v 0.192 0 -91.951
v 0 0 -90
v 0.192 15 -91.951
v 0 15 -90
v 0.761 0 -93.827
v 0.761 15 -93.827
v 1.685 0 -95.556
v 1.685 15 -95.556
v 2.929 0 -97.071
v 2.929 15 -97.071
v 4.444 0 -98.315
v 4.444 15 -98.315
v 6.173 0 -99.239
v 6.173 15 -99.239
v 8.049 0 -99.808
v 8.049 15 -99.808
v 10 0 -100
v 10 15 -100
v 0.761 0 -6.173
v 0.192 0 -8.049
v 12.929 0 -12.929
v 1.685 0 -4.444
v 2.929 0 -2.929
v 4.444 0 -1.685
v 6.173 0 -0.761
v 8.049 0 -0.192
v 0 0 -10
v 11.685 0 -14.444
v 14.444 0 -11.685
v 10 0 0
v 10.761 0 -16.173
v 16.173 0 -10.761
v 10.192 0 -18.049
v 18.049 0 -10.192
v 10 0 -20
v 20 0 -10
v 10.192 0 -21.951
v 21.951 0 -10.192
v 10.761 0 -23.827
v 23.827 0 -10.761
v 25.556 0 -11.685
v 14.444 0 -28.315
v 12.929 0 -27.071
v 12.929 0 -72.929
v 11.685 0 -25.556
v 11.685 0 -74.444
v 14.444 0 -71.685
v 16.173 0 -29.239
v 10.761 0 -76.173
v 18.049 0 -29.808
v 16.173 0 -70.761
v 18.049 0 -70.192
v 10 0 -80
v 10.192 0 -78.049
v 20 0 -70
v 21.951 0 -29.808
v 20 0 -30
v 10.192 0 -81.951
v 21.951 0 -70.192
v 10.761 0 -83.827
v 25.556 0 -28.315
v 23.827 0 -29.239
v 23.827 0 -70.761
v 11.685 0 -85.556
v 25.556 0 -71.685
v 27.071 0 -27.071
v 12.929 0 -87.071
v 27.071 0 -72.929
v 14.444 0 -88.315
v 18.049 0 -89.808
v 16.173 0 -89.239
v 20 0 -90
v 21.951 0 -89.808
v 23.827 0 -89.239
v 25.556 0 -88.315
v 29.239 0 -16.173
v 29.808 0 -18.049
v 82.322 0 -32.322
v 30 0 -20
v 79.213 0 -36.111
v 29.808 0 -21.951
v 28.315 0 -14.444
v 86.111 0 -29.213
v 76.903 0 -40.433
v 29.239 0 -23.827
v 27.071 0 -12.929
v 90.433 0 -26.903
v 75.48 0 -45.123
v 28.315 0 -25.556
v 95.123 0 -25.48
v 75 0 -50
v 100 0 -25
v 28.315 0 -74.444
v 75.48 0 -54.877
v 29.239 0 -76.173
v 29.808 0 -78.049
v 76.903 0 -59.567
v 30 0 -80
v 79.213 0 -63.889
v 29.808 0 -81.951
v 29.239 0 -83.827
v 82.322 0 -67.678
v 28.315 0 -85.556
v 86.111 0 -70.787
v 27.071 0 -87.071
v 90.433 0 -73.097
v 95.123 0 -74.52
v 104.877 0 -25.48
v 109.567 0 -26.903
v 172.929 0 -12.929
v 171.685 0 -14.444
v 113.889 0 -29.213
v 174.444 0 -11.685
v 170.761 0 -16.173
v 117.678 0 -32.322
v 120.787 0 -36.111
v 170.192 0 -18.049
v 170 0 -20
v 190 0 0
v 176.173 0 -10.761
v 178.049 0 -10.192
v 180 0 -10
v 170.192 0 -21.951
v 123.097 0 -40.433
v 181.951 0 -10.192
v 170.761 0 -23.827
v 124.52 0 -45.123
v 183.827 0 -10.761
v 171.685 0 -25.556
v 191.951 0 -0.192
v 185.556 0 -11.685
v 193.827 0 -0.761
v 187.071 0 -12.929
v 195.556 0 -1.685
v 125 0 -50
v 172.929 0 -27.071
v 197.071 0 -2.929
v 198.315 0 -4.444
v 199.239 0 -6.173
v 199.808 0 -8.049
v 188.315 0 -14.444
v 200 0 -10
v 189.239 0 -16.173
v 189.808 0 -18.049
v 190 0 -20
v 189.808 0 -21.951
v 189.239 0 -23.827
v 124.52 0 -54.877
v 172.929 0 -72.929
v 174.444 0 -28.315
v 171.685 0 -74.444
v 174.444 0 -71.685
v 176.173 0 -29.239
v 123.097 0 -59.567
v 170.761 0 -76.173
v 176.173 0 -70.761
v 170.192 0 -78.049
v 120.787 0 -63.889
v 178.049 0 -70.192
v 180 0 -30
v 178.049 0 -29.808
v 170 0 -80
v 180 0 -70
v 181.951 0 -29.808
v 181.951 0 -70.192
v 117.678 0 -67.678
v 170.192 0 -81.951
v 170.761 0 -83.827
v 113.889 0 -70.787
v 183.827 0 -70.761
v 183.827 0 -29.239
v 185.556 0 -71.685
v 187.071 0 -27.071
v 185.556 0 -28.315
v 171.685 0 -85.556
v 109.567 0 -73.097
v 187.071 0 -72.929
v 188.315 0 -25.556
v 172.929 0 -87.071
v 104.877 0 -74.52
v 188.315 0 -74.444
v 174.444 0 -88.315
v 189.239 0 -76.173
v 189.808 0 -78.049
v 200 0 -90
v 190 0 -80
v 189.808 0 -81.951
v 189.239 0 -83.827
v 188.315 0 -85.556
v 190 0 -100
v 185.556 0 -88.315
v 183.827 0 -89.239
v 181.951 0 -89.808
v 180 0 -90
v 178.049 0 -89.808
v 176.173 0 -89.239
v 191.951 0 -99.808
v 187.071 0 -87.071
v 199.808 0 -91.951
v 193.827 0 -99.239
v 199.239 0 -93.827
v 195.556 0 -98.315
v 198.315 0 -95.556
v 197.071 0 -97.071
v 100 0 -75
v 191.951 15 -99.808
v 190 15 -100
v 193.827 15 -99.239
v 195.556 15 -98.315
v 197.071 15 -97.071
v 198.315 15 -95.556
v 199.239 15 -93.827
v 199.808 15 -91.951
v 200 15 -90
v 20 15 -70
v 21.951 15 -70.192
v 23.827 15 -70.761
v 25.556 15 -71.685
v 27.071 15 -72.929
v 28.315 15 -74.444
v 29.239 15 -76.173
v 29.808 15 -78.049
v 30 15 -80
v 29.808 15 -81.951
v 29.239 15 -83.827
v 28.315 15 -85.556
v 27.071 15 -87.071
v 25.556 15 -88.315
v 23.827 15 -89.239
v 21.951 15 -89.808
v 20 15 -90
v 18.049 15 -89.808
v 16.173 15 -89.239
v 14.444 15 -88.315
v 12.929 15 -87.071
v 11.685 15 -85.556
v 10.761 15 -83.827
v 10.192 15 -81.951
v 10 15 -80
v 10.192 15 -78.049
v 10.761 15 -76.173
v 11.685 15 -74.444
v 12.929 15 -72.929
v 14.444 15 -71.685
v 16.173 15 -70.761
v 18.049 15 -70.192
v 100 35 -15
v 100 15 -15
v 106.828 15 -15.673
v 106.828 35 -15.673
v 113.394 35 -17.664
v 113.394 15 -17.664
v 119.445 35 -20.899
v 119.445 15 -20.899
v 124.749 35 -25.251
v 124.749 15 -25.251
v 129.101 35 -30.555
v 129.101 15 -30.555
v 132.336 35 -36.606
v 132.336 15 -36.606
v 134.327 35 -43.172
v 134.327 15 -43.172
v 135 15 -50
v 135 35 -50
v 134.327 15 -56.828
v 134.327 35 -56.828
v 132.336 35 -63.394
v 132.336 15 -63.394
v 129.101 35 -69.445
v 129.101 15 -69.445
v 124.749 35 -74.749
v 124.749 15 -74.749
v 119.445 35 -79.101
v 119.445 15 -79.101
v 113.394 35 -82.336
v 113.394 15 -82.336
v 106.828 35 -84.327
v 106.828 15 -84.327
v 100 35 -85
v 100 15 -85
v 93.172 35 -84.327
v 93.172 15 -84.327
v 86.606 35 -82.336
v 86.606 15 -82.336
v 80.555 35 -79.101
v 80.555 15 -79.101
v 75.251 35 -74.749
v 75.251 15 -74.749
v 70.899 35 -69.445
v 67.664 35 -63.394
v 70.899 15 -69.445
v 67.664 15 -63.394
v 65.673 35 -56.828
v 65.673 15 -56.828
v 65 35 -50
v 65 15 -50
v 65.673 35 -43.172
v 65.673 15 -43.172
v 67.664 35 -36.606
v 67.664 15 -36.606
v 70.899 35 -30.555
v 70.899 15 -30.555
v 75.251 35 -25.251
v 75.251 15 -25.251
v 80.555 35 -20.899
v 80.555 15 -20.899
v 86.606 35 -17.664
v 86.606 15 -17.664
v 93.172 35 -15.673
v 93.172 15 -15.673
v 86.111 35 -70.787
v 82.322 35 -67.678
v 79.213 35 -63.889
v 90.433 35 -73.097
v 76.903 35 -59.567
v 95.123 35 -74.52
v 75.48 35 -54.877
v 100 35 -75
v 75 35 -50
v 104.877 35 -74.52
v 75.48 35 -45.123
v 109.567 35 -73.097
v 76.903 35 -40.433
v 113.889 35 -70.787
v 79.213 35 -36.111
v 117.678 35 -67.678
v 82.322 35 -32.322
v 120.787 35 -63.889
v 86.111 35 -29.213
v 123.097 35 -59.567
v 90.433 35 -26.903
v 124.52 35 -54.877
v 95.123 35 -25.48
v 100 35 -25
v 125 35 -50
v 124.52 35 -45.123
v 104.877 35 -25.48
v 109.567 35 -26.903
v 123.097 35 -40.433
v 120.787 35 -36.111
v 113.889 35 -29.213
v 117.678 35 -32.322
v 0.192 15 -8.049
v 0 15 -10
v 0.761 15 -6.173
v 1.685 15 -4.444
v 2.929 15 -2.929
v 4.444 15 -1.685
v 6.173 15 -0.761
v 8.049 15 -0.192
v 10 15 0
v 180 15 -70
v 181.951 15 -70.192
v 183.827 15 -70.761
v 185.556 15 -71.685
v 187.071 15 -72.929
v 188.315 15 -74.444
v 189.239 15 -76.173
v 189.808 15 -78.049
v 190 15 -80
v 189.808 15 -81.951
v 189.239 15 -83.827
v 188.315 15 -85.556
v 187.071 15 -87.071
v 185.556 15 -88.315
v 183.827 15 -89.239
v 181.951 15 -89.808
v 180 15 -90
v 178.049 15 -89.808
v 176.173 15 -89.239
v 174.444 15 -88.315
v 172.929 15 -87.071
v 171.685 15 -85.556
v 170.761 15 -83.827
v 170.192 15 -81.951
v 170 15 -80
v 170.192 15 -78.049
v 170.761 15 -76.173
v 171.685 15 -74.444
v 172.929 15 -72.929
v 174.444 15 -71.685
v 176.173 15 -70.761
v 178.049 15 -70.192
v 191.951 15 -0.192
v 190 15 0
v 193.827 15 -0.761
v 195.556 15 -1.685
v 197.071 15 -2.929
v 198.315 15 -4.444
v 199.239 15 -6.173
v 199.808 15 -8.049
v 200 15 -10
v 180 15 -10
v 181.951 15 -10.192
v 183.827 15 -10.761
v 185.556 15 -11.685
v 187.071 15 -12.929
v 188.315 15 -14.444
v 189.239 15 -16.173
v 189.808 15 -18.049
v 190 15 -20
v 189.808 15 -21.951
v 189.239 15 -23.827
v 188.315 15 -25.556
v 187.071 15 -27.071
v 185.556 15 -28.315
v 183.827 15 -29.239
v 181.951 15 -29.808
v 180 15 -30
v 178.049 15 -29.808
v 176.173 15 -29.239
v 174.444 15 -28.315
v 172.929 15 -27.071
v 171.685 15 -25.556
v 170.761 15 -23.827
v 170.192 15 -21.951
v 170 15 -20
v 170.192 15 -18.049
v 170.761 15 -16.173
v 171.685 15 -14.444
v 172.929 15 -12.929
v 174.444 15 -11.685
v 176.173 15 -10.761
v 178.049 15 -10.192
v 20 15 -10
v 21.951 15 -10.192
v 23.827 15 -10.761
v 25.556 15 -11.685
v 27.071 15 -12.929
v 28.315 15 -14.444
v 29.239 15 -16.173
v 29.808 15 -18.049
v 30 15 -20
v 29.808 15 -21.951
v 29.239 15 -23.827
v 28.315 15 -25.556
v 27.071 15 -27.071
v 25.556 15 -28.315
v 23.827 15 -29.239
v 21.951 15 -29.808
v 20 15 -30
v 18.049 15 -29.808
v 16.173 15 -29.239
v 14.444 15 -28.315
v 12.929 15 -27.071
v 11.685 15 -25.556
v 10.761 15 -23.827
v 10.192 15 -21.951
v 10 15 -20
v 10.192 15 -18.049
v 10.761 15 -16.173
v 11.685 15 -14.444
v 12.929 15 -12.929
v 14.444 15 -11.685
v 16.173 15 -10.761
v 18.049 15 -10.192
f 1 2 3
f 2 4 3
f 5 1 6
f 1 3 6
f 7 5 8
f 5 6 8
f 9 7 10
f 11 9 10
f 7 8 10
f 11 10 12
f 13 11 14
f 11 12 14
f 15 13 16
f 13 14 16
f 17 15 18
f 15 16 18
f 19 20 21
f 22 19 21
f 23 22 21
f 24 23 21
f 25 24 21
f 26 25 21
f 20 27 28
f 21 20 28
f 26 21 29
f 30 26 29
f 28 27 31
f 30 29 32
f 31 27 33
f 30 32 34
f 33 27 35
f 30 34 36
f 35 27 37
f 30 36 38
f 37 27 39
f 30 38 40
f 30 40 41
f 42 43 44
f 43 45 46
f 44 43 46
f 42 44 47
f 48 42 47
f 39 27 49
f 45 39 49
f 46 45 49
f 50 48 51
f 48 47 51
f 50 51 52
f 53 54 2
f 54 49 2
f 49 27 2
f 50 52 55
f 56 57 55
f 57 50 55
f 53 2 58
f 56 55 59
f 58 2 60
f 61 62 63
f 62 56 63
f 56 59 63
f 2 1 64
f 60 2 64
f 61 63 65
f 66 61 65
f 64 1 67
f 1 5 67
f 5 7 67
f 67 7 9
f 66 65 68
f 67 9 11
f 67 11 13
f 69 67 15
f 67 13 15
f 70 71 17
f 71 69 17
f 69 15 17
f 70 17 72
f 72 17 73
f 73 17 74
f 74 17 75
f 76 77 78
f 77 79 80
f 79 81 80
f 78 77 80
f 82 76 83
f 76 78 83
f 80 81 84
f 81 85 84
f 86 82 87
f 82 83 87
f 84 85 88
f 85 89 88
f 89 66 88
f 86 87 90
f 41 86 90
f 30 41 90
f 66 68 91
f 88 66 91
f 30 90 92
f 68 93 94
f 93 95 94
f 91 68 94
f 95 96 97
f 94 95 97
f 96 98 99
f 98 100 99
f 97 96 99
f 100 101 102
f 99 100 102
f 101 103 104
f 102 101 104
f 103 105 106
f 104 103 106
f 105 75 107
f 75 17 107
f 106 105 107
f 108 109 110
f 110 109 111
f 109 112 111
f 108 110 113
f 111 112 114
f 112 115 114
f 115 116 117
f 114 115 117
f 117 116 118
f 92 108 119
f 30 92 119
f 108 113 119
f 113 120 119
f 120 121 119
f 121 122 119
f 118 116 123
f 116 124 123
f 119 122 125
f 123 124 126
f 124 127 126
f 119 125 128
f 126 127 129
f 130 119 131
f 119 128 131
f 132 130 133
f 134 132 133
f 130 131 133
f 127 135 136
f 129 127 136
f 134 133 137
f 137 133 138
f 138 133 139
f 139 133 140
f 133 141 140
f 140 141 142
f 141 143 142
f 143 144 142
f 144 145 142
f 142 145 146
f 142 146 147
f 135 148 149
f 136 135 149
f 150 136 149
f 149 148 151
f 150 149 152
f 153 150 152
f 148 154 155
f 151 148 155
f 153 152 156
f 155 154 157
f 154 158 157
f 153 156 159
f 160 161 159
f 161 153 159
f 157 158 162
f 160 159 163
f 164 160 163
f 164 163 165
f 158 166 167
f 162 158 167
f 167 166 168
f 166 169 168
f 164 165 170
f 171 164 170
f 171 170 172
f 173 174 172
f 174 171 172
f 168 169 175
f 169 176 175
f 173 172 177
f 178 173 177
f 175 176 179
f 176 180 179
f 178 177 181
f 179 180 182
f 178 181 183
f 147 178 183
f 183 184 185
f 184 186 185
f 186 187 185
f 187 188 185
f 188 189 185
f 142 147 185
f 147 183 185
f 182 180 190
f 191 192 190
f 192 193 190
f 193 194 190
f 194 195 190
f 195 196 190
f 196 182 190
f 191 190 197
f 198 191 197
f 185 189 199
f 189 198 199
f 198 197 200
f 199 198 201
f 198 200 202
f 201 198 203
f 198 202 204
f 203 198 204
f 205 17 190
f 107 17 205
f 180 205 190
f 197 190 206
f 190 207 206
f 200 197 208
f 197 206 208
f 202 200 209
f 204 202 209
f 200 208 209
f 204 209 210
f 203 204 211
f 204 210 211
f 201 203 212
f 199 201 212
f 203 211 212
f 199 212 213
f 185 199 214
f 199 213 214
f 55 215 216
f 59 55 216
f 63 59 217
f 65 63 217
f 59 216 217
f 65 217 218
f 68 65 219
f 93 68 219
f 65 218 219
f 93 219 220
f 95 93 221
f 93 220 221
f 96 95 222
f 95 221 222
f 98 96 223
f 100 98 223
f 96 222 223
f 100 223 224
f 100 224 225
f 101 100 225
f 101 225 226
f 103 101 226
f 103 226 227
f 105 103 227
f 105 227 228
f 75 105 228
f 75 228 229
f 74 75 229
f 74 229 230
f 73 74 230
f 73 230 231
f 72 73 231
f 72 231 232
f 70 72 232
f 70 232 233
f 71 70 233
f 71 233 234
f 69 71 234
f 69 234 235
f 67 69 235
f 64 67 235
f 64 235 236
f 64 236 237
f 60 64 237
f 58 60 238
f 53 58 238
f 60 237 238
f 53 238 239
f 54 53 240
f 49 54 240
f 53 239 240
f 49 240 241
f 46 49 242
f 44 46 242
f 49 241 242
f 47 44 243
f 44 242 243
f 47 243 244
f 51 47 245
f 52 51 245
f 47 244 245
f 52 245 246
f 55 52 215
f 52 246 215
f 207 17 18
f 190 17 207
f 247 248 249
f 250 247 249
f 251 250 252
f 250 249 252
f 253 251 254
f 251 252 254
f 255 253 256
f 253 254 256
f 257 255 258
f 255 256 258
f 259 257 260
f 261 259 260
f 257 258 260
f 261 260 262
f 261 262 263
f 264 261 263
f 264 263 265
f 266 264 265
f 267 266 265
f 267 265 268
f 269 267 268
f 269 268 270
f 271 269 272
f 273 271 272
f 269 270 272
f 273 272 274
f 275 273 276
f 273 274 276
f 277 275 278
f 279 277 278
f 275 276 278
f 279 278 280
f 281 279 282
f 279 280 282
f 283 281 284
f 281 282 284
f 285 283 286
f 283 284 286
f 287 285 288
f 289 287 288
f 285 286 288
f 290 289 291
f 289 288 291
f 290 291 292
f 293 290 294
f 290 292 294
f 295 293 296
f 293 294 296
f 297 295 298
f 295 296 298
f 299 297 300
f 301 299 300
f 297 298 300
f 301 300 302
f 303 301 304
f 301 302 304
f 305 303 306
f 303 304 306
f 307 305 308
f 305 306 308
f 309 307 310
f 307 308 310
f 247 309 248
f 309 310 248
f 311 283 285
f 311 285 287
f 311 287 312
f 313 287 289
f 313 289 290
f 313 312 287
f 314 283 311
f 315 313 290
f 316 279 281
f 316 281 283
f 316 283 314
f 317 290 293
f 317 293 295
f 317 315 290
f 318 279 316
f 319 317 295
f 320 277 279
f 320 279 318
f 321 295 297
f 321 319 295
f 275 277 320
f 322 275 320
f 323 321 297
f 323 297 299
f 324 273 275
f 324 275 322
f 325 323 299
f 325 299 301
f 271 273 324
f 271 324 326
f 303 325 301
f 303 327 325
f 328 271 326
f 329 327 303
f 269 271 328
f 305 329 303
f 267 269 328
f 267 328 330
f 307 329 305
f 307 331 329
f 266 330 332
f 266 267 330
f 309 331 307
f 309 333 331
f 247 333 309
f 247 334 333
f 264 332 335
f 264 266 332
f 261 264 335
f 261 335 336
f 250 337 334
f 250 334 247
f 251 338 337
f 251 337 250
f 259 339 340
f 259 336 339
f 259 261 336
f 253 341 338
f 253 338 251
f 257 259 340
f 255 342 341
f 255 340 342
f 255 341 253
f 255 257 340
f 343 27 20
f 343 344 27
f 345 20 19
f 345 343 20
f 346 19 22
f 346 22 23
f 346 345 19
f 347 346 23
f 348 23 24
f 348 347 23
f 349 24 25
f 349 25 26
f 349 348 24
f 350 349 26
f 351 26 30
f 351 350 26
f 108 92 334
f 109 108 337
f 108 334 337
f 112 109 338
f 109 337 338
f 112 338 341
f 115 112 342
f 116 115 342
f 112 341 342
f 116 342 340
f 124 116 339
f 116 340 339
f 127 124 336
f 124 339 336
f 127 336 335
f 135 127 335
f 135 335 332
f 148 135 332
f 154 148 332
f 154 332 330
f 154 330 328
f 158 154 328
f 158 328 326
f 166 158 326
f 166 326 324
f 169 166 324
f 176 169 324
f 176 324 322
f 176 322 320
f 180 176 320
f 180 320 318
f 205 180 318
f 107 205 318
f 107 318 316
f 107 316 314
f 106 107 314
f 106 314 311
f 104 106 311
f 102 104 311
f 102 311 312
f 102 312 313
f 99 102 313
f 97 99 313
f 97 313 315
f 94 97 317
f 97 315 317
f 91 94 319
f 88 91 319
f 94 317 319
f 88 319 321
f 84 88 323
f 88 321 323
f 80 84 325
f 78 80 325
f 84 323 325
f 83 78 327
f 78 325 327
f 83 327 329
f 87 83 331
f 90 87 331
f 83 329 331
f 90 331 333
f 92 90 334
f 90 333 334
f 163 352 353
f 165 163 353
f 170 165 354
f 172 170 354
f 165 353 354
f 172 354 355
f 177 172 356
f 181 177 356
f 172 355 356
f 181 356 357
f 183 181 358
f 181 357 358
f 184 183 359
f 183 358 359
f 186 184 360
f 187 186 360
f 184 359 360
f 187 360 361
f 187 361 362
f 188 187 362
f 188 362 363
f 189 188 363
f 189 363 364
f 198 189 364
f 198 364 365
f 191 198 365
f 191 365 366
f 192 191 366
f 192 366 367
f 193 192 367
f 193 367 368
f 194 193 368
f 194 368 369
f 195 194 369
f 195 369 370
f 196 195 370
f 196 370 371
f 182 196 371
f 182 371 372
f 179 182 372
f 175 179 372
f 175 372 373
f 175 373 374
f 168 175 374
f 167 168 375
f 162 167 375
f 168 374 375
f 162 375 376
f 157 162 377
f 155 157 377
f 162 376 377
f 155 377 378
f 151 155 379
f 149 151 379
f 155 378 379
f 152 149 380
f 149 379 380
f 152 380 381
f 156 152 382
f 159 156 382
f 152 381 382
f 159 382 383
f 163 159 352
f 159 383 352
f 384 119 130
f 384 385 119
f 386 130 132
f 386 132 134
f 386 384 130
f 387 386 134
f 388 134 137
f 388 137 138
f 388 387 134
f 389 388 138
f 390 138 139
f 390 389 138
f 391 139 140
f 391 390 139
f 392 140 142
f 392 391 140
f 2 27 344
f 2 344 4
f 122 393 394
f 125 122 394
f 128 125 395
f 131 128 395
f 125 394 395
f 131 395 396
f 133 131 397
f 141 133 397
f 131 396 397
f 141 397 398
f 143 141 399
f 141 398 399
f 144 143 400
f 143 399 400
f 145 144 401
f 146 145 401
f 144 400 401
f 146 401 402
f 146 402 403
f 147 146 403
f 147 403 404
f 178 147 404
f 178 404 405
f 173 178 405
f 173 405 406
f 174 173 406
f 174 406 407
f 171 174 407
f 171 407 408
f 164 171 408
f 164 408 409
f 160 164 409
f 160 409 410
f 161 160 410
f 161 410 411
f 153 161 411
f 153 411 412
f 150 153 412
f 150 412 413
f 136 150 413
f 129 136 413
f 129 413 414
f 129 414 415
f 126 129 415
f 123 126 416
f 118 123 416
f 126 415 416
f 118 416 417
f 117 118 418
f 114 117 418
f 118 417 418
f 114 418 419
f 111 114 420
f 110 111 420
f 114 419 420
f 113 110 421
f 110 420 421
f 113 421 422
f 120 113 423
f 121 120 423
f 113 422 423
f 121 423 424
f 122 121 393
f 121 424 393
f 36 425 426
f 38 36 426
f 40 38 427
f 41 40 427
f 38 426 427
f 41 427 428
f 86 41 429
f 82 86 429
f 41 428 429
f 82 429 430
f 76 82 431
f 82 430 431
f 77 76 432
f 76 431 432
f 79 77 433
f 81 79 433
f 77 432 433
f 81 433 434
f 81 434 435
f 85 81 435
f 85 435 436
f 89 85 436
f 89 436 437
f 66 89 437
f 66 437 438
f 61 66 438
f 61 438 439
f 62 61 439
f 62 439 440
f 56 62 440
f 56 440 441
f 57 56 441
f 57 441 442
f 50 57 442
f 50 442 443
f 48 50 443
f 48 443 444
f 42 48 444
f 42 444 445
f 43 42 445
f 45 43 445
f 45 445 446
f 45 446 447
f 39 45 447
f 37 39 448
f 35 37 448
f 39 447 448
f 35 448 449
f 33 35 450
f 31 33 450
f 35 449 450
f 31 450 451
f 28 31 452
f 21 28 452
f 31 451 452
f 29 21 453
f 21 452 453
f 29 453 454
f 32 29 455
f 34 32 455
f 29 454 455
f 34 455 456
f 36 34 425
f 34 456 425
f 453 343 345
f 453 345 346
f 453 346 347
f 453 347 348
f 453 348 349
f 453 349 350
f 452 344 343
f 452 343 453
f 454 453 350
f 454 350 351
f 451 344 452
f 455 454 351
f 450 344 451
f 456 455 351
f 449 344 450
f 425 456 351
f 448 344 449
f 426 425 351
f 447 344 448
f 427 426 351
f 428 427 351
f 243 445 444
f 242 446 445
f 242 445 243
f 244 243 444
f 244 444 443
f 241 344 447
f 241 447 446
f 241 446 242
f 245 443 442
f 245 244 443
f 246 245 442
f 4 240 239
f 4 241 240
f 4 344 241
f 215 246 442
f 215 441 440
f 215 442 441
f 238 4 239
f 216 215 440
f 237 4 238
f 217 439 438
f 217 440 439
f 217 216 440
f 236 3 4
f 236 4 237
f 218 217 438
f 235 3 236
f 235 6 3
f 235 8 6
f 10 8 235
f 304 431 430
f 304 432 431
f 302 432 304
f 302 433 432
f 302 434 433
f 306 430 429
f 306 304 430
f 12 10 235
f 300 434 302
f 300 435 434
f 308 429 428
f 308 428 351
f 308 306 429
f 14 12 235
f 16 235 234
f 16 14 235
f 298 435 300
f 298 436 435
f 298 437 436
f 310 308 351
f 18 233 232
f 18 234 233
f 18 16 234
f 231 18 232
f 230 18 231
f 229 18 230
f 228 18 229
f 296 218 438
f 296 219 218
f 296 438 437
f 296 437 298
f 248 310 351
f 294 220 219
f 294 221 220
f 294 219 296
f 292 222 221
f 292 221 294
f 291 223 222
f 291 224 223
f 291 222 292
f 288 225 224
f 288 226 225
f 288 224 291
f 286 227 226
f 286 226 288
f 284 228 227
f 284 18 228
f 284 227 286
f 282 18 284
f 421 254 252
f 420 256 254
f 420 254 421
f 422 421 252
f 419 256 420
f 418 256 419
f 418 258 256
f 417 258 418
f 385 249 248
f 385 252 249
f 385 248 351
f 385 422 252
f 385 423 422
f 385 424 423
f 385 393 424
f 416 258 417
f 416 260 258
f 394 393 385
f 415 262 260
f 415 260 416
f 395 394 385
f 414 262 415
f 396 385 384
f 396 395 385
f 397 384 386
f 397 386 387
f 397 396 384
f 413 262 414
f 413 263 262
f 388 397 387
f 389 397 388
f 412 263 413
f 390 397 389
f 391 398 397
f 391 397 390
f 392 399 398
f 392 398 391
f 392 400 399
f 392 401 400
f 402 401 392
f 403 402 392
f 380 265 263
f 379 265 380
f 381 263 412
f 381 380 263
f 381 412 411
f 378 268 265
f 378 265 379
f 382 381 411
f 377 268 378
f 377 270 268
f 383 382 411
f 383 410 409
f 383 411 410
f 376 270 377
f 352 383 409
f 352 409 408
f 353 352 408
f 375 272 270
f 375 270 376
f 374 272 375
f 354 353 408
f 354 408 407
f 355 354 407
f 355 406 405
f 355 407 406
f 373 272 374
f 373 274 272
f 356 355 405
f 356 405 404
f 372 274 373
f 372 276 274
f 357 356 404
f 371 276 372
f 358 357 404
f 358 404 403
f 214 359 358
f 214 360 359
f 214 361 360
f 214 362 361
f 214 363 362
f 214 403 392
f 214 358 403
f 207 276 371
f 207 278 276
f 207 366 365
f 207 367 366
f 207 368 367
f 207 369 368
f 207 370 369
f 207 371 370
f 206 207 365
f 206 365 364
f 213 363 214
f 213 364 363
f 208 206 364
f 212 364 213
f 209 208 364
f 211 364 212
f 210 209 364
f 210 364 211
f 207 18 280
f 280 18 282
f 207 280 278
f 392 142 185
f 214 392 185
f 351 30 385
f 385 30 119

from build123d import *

# Parameters (mm, degrees)
SKETCH_1_W          = 200
SKETCH_1_H          = 100
EXTRUDE_1_DEPTH     = 15
SKETCH_2_R          = 35
EXTRUDE_2_DEPTH     = 20
SKETCH_3_R          = 25
CUT_EXTRUDE_1_DEPTH = 227.329405955
SKETCH_4_R          = 10
CUT_EXTRUDE_2_DEPTH = 225.499443206
FILLET_1_R          = 10


with BuildPart() as part:
    # Эскиз1 → Бобышка-Вытянуть1 (new body)
    with BuildSketch(Plane(origin=(0, 0, 0), x_dir=(1, 0, 0), z_dir=(0, 1, 0))):
        with Locations((100, 50)):
            Rectangle(SKETCH_1_W, SKETCH_1_H)
    extrude(amount=EXTRUDE_1_DEPTH)

    # Эскиз2 → Бобышка-Вытянуть2 (add)
    with BuildSketch(Plane(origin=(0, 15, 0), x_dir=(1, 0, 0), z_dir=(0, 1, 0))):
        with Locations(Location((100, 50, 0), (0, 0, 270))):
            Circle(SKETCH_2_R)
    extrude(amount=EXTRUDE_2_DEPTH)

    # Эскиз3 → Вырез-Вытянуть1 (cut, through all)
    with BuildSketch(Plane(origin=(0, 35, 0), x_dir=(1, 0, 0), z_dir=(0, 1, 0))):
        with Locations(Location((100, 50, 0), (0, 0, 270))):
            Circle(SKETCH_3_R)
    extrude(amount=-CUT_EXTRUDE_1_DEPTH, mode=Mode.SUBTRACT)

    # Эскиз4 → Вырез-Вытянуть2 (cut, through all)
    with BuildSketch(Plane(origin=(0, 15, 0), x_dir=(1, 0, 0), z_dir=(0, 1, 0))):
        with Locations(Location((20, 20, 0), (0, 0, 270))):
            Circle(SKETCH_4_R)
        with Locations(Location((20, 80, 0), (0, 0, 270))):
            Circle(SKETCH_4_R)
        with Locations(Location((180, 80, 0), (0, 0, 270))):
            Circle(SKETCH_4_R)
        with Locations(Location((180, 20, 0), (0, 0, 270))):
            Circle(SKETCH_4_R)
    extrude(amount=-CUT_EXTRUDE_2_DEPTH, mode=Mode.SUBTRACT)

    # Скругление1
    fillet_1_edges = [part.edges().sort_by_distance(p)[0] for p in [
        (0, 7.5, 0),
        (0, 7.5, -100),
        (200, 7.5, -100),
        (200, 7.5, 0),
    ]]
    fillet(fillet_1_edges, radius=FILLET_1_R)


solid = part.part
